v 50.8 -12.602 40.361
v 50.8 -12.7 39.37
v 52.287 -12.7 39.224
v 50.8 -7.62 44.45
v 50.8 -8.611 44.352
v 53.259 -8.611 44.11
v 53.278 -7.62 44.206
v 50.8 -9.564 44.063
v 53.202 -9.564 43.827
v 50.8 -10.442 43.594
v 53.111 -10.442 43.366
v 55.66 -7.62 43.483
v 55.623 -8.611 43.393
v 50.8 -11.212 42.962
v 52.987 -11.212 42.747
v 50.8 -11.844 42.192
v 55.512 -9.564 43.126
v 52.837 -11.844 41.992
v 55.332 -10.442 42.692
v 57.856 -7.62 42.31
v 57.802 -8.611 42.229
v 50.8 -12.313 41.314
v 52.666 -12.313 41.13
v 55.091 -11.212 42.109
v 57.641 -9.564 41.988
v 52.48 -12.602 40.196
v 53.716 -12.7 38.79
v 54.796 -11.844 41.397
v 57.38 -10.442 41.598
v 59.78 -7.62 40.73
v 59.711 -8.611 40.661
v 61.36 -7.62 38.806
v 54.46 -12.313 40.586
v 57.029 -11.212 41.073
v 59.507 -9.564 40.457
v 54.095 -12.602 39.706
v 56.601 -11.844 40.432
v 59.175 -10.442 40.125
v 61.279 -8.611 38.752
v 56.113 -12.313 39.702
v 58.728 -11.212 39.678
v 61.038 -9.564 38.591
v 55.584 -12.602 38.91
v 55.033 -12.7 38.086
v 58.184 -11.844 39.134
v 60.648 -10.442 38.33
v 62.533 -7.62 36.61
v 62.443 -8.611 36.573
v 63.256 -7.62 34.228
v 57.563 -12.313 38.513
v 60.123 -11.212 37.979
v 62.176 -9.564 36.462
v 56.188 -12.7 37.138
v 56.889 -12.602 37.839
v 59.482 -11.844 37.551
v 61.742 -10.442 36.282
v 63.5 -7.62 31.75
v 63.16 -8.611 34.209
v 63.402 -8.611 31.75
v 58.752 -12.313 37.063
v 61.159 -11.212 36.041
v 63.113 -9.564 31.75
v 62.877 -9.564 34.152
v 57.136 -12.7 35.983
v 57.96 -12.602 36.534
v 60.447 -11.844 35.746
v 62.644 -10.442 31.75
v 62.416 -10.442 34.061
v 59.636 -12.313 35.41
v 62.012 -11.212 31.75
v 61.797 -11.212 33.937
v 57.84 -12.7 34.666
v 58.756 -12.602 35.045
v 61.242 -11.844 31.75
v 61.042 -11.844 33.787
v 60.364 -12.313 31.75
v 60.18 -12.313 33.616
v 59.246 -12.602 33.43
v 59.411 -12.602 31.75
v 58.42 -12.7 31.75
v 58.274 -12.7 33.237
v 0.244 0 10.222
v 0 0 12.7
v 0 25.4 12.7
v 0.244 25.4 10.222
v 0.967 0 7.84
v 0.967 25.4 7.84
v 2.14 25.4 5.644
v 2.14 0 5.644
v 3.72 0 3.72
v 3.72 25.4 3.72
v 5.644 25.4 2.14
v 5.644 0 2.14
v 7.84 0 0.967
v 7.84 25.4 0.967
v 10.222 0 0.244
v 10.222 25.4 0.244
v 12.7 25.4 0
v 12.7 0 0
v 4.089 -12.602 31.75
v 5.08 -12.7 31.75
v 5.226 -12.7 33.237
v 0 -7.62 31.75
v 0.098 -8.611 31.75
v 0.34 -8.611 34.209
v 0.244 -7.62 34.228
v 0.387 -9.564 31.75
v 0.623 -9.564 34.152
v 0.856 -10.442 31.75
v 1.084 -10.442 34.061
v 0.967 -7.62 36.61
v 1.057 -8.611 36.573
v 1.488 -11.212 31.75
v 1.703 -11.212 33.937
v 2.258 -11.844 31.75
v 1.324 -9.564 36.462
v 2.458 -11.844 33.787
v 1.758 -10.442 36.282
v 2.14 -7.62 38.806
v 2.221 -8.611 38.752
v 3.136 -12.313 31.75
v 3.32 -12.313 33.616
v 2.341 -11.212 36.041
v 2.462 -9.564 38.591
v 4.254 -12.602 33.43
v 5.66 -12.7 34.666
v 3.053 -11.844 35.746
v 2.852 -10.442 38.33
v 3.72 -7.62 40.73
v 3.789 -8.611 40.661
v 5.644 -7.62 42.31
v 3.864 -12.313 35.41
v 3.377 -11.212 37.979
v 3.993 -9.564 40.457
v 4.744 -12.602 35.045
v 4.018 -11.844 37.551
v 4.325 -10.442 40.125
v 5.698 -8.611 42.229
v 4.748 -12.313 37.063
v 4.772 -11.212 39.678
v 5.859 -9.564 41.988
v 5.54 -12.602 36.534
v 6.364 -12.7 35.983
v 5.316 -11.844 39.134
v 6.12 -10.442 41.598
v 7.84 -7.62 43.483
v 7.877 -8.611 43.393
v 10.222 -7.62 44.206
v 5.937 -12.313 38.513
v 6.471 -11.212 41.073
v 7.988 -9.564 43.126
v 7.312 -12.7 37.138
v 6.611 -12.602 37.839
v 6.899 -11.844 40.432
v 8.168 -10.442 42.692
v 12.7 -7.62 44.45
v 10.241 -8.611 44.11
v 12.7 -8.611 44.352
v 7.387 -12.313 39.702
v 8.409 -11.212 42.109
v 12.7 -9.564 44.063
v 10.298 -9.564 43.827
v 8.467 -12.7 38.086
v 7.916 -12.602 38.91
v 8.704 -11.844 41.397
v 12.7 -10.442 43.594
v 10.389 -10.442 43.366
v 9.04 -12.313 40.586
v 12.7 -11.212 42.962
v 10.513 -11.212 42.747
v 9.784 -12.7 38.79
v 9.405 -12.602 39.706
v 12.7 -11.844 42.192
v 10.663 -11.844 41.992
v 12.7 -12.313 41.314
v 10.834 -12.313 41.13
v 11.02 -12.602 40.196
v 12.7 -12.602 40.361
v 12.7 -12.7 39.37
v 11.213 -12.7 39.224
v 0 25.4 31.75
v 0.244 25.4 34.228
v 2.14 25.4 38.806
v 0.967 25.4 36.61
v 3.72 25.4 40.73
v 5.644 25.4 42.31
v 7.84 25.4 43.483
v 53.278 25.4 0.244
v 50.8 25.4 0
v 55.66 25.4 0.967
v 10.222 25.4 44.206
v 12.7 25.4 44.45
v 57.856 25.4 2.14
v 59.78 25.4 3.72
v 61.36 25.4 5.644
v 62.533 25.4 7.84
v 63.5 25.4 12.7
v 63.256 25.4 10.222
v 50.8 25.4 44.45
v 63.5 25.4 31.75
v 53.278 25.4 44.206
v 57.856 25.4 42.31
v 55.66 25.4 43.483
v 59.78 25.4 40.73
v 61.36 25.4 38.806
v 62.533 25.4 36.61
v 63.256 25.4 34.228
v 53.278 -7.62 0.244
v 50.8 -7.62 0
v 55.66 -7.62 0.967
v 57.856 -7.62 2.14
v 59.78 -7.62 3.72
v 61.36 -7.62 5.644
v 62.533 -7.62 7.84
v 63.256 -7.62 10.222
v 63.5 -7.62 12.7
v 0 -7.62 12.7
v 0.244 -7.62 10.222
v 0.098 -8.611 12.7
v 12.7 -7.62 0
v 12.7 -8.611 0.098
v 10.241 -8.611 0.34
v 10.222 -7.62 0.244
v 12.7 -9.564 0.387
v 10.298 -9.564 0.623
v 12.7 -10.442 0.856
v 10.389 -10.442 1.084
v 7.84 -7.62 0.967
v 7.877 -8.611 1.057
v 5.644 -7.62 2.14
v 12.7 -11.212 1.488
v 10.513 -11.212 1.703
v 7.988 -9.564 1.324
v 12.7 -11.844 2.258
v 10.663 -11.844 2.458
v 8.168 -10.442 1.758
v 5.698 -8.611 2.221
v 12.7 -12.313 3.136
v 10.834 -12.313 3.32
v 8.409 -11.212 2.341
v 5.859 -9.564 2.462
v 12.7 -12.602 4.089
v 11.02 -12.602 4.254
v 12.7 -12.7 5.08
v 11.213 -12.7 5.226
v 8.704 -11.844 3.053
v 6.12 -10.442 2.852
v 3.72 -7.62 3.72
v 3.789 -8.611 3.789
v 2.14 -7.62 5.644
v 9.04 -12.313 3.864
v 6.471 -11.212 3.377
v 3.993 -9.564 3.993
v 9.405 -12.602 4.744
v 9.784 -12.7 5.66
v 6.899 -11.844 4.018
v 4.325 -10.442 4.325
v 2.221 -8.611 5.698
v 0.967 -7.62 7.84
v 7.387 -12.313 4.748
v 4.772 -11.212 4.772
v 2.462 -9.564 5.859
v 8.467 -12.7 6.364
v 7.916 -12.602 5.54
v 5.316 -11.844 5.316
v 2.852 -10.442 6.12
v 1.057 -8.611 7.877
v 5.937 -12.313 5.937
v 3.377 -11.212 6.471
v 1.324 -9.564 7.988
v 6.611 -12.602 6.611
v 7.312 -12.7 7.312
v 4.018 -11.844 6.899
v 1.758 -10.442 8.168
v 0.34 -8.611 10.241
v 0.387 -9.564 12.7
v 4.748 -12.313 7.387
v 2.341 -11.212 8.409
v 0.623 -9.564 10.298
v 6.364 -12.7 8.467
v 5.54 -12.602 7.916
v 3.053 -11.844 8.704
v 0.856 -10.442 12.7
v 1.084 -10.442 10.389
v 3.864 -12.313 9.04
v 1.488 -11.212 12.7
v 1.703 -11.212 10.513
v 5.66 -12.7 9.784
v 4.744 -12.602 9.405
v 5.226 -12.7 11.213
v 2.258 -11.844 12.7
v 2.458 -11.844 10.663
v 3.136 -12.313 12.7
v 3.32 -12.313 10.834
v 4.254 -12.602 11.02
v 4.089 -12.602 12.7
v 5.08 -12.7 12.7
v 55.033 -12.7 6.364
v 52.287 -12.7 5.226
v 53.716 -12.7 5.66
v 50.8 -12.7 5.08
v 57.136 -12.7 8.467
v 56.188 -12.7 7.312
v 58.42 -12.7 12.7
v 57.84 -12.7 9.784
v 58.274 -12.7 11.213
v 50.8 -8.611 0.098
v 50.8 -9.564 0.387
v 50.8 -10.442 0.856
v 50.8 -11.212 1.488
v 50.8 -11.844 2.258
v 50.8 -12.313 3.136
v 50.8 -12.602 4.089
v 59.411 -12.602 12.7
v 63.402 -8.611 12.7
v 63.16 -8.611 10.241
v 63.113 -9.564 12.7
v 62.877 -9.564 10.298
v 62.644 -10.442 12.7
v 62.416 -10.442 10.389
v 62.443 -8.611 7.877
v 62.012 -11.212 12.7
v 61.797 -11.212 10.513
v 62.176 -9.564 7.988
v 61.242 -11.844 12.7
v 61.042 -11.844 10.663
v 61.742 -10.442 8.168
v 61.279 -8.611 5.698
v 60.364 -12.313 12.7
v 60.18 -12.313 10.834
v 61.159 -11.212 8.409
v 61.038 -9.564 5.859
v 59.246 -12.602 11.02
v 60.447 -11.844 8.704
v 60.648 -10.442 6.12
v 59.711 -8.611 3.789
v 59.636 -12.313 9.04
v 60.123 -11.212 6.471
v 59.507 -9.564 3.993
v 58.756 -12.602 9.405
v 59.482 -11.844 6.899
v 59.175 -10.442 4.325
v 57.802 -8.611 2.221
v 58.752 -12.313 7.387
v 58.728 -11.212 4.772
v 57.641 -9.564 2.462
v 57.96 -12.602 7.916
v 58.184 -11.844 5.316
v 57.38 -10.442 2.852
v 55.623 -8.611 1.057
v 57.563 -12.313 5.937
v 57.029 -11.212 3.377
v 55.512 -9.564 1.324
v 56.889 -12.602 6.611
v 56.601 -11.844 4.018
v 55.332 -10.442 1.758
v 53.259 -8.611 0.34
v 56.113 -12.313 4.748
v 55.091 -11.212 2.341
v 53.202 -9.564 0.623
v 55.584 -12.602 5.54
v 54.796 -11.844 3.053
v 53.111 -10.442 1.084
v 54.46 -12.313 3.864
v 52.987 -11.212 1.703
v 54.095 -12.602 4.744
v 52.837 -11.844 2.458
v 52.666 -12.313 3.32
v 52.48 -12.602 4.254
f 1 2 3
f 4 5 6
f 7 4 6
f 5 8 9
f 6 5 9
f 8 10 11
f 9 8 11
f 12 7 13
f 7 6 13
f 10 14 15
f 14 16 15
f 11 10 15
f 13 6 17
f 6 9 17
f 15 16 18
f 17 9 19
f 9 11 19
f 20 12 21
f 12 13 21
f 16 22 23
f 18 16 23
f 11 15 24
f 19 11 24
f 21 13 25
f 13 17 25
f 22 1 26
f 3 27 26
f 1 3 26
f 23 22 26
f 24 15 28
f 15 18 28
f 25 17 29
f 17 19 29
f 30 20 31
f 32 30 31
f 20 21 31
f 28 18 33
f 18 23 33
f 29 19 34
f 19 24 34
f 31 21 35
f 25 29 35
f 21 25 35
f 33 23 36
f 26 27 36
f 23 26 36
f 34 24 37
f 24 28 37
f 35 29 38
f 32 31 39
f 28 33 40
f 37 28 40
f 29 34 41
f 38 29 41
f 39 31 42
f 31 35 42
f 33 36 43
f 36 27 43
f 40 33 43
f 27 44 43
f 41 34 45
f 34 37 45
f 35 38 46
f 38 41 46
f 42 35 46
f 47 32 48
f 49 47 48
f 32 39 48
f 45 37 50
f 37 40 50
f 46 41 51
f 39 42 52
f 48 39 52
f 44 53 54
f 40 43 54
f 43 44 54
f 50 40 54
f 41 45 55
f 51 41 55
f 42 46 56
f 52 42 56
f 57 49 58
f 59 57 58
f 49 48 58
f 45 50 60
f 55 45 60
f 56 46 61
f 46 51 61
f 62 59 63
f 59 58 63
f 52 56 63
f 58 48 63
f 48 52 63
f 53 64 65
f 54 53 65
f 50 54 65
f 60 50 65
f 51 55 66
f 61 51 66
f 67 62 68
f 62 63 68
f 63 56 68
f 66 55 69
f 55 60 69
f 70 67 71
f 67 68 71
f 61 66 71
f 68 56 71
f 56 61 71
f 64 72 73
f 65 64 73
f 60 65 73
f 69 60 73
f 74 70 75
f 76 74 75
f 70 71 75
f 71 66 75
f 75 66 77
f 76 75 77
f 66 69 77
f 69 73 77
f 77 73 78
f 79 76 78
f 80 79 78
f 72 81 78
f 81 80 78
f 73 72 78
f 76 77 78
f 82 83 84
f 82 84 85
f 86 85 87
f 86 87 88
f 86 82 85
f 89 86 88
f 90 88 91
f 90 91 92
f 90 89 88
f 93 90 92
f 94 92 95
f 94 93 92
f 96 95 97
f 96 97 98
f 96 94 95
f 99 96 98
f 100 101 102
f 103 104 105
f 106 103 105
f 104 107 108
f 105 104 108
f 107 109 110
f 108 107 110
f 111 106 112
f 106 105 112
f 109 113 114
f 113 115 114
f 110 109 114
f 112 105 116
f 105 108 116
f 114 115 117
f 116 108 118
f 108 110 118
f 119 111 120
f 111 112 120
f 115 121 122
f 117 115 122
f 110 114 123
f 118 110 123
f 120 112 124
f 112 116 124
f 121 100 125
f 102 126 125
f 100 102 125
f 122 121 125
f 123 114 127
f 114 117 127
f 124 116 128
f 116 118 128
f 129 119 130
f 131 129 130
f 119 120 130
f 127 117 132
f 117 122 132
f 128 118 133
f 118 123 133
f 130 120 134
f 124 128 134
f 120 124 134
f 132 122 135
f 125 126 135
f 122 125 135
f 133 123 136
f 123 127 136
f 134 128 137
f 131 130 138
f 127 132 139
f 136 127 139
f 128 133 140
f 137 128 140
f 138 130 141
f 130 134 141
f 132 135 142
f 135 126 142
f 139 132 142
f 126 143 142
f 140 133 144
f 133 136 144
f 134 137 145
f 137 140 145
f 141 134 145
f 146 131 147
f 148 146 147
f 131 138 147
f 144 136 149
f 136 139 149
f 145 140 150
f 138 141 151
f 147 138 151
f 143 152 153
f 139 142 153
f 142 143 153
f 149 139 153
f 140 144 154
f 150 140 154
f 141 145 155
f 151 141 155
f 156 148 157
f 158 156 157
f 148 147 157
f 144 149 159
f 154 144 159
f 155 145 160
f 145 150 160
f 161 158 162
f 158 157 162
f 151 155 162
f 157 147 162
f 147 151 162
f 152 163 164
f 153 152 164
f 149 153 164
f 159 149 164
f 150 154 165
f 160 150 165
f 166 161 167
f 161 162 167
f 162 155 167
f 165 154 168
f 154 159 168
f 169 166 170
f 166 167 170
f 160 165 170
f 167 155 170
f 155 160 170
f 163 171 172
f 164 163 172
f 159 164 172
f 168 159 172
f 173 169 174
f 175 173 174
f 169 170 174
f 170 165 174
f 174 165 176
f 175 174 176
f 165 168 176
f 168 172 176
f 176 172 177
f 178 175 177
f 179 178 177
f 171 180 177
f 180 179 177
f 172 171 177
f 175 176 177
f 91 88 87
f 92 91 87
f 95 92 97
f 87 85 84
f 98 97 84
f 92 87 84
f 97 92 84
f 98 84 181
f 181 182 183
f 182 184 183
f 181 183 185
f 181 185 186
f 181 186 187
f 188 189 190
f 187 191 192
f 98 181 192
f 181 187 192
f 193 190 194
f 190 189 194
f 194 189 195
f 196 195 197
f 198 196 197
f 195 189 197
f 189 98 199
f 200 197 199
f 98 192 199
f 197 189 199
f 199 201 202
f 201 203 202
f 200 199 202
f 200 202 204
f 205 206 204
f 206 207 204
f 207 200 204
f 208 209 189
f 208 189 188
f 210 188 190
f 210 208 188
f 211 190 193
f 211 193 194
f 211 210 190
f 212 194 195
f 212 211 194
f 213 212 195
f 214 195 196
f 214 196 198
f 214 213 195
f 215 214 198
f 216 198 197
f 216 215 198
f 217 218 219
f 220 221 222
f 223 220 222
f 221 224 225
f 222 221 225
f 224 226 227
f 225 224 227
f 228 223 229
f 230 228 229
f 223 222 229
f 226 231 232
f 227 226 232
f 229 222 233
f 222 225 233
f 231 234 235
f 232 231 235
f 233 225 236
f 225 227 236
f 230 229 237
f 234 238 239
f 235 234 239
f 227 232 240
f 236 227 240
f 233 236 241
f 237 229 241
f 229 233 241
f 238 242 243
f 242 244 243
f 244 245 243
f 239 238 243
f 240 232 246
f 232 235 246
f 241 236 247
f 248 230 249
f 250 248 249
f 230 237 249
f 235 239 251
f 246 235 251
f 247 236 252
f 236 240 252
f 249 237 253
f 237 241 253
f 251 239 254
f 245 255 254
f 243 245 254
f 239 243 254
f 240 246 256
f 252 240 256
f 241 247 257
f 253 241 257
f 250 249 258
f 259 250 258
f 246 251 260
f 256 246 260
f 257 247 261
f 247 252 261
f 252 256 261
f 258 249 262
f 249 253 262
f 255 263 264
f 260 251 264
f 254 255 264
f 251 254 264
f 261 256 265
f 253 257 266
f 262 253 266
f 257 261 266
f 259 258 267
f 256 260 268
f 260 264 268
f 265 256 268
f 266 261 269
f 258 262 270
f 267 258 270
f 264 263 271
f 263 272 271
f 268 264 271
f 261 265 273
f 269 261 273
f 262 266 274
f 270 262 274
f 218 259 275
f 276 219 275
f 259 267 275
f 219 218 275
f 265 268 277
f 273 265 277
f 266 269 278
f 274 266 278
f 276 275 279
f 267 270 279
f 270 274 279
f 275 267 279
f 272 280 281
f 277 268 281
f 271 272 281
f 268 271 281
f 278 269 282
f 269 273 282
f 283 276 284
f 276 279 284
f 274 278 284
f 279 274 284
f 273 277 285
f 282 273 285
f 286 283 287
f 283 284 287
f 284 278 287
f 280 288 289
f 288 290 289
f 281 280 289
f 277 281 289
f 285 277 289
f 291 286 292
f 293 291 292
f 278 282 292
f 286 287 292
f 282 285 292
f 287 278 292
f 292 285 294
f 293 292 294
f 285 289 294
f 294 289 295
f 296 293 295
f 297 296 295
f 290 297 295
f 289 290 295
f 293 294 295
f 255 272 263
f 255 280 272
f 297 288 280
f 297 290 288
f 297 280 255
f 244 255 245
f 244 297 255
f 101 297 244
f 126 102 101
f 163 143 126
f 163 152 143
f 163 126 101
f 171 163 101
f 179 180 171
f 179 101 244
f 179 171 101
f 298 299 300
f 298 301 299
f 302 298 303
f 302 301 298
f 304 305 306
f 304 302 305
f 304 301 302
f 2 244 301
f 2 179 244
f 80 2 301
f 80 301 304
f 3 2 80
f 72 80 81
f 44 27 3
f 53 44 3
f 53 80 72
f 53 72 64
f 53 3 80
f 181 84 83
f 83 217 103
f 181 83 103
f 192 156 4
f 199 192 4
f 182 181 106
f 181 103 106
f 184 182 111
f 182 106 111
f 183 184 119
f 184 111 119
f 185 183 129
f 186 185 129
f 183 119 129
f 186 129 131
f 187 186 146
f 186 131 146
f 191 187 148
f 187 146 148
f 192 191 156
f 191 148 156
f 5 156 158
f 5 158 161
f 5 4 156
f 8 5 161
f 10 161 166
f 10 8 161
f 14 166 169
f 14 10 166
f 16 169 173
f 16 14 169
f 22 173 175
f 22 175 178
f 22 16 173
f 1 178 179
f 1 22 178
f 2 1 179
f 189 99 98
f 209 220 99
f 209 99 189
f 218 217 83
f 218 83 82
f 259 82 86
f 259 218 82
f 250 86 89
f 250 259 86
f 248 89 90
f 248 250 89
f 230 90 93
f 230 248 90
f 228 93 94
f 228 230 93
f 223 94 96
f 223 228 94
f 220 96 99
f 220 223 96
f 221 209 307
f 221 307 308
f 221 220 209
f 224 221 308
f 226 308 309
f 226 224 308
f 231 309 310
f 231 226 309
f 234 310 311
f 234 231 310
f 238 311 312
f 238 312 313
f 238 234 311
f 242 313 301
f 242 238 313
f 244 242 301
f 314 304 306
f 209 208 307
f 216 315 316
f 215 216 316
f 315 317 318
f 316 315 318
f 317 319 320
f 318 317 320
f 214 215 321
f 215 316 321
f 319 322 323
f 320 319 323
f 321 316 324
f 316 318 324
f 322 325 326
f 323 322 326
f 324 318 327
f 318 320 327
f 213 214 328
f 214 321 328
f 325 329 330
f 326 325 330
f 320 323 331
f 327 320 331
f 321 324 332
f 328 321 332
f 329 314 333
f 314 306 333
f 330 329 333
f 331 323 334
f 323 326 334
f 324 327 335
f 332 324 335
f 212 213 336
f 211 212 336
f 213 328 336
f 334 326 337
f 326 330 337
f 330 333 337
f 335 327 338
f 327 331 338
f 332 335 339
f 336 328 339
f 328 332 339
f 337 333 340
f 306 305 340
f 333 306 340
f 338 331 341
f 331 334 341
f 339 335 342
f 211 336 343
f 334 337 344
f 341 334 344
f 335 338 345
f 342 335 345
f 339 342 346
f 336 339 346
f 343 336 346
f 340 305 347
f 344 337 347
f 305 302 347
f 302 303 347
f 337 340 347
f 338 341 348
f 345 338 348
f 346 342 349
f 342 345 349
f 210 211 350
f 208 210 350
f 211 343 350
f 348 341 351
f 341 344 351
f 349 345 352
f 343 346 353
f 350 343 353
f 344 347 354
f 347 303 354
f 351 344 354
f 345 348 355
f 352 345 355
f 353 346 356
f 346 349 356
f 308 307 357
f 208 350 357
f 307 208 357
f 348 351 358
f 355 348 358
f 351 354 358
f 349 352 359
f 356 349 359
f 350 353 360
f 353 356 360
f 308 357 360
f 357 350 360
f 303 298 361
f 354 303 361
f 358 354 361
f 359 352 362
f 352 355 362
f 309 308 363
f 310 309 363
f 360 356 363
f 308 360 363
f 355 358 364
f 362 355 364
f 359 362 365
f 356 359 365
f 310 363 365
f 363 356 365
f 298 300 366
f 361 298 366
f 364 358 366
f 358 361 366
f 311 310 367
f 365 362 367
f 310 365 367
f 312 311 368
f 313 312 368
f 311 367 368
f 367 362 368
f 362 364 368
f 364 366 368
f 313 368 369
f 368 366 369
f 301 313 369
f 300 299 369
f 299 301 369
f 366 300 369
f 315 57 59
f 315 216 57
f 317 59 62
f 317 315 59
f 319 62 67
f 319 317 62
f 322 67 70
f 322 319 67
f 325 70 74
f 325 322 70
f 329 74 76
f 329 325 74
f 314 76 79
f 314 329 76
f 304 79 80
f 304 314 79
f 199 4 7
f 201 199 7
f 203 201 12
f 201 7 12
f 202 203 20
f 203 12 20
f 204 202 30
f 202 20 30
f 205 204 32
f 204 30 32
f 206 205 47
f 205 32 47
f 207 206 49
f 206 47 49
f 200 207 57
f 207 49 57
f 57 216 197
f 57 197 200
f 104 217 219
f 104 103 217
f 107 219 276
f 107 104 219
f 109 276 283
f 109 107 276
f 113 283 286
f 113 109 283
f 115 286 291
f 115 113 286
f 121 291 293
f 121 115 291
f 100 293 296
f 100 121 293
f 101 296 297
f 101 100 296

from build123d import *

# Parameters (mm, degrees)
F0_W     = 63.5
F0_H     = 44.45
F1_DEPTH = 12.7
F2_R     = 12.7
F3_R     = 12.7
F4_R     = 12.7
F5_R     = 12.7
F6_R     = 5.08
F7_DEPTH = 25.4


with BuildPart() as f1:
    # F0 (on Front) → F1 (new body)
    with BuildSketch(Plane.XZ):
        with Locations((31.75, 22.225)):
            Rectangle(F0_W, F0_H)
    extrude(amount=F1_DEPTH)

    # F2
    f2_edges = [f1.edges().sort_by_distance(p)[0] for p in [
        (0, -6.35, 44.45),
    ]]
    fillet(f2_edges, radius=F2_R)

    # F3
    f3_edges = [f1.edges().sort_by_distance(p)[0] for p in [
        (63.5, -6.35, 44.45),
    ]]
    fillet(f3_edges, radius=F3_R)

    # F4
    f4_edges = [f1.edges().sort_by_distance(p)[0] for p in [
        (0, -6.35, 0),
    ]]
    fillet(f4_edges, radius=F4_R)

    # F5
    f5_edges = [f1.edges().sort_by_distance(p)[0] for p in [
        (63.5, -6.35, 0),
    ]]
    fillet(f5_edges, radius=F5_R)

    # F6
    f6_edges = [f1.edges().sort_by_distance(p)[0] for p in [
        (59.780256, -12.7, 40.730256),
    ]]
    fillet(f6_edges, radius=F6_R)

    # F7 (add): a face of the model
    f7_faces = [f1.faces().sort_by_distance(p)[0] for p in [
        (31.75, 0, 22.225),
    ]]
    extrude(f7_faces, amount=F7_DEPTH)


solid = f1.part
